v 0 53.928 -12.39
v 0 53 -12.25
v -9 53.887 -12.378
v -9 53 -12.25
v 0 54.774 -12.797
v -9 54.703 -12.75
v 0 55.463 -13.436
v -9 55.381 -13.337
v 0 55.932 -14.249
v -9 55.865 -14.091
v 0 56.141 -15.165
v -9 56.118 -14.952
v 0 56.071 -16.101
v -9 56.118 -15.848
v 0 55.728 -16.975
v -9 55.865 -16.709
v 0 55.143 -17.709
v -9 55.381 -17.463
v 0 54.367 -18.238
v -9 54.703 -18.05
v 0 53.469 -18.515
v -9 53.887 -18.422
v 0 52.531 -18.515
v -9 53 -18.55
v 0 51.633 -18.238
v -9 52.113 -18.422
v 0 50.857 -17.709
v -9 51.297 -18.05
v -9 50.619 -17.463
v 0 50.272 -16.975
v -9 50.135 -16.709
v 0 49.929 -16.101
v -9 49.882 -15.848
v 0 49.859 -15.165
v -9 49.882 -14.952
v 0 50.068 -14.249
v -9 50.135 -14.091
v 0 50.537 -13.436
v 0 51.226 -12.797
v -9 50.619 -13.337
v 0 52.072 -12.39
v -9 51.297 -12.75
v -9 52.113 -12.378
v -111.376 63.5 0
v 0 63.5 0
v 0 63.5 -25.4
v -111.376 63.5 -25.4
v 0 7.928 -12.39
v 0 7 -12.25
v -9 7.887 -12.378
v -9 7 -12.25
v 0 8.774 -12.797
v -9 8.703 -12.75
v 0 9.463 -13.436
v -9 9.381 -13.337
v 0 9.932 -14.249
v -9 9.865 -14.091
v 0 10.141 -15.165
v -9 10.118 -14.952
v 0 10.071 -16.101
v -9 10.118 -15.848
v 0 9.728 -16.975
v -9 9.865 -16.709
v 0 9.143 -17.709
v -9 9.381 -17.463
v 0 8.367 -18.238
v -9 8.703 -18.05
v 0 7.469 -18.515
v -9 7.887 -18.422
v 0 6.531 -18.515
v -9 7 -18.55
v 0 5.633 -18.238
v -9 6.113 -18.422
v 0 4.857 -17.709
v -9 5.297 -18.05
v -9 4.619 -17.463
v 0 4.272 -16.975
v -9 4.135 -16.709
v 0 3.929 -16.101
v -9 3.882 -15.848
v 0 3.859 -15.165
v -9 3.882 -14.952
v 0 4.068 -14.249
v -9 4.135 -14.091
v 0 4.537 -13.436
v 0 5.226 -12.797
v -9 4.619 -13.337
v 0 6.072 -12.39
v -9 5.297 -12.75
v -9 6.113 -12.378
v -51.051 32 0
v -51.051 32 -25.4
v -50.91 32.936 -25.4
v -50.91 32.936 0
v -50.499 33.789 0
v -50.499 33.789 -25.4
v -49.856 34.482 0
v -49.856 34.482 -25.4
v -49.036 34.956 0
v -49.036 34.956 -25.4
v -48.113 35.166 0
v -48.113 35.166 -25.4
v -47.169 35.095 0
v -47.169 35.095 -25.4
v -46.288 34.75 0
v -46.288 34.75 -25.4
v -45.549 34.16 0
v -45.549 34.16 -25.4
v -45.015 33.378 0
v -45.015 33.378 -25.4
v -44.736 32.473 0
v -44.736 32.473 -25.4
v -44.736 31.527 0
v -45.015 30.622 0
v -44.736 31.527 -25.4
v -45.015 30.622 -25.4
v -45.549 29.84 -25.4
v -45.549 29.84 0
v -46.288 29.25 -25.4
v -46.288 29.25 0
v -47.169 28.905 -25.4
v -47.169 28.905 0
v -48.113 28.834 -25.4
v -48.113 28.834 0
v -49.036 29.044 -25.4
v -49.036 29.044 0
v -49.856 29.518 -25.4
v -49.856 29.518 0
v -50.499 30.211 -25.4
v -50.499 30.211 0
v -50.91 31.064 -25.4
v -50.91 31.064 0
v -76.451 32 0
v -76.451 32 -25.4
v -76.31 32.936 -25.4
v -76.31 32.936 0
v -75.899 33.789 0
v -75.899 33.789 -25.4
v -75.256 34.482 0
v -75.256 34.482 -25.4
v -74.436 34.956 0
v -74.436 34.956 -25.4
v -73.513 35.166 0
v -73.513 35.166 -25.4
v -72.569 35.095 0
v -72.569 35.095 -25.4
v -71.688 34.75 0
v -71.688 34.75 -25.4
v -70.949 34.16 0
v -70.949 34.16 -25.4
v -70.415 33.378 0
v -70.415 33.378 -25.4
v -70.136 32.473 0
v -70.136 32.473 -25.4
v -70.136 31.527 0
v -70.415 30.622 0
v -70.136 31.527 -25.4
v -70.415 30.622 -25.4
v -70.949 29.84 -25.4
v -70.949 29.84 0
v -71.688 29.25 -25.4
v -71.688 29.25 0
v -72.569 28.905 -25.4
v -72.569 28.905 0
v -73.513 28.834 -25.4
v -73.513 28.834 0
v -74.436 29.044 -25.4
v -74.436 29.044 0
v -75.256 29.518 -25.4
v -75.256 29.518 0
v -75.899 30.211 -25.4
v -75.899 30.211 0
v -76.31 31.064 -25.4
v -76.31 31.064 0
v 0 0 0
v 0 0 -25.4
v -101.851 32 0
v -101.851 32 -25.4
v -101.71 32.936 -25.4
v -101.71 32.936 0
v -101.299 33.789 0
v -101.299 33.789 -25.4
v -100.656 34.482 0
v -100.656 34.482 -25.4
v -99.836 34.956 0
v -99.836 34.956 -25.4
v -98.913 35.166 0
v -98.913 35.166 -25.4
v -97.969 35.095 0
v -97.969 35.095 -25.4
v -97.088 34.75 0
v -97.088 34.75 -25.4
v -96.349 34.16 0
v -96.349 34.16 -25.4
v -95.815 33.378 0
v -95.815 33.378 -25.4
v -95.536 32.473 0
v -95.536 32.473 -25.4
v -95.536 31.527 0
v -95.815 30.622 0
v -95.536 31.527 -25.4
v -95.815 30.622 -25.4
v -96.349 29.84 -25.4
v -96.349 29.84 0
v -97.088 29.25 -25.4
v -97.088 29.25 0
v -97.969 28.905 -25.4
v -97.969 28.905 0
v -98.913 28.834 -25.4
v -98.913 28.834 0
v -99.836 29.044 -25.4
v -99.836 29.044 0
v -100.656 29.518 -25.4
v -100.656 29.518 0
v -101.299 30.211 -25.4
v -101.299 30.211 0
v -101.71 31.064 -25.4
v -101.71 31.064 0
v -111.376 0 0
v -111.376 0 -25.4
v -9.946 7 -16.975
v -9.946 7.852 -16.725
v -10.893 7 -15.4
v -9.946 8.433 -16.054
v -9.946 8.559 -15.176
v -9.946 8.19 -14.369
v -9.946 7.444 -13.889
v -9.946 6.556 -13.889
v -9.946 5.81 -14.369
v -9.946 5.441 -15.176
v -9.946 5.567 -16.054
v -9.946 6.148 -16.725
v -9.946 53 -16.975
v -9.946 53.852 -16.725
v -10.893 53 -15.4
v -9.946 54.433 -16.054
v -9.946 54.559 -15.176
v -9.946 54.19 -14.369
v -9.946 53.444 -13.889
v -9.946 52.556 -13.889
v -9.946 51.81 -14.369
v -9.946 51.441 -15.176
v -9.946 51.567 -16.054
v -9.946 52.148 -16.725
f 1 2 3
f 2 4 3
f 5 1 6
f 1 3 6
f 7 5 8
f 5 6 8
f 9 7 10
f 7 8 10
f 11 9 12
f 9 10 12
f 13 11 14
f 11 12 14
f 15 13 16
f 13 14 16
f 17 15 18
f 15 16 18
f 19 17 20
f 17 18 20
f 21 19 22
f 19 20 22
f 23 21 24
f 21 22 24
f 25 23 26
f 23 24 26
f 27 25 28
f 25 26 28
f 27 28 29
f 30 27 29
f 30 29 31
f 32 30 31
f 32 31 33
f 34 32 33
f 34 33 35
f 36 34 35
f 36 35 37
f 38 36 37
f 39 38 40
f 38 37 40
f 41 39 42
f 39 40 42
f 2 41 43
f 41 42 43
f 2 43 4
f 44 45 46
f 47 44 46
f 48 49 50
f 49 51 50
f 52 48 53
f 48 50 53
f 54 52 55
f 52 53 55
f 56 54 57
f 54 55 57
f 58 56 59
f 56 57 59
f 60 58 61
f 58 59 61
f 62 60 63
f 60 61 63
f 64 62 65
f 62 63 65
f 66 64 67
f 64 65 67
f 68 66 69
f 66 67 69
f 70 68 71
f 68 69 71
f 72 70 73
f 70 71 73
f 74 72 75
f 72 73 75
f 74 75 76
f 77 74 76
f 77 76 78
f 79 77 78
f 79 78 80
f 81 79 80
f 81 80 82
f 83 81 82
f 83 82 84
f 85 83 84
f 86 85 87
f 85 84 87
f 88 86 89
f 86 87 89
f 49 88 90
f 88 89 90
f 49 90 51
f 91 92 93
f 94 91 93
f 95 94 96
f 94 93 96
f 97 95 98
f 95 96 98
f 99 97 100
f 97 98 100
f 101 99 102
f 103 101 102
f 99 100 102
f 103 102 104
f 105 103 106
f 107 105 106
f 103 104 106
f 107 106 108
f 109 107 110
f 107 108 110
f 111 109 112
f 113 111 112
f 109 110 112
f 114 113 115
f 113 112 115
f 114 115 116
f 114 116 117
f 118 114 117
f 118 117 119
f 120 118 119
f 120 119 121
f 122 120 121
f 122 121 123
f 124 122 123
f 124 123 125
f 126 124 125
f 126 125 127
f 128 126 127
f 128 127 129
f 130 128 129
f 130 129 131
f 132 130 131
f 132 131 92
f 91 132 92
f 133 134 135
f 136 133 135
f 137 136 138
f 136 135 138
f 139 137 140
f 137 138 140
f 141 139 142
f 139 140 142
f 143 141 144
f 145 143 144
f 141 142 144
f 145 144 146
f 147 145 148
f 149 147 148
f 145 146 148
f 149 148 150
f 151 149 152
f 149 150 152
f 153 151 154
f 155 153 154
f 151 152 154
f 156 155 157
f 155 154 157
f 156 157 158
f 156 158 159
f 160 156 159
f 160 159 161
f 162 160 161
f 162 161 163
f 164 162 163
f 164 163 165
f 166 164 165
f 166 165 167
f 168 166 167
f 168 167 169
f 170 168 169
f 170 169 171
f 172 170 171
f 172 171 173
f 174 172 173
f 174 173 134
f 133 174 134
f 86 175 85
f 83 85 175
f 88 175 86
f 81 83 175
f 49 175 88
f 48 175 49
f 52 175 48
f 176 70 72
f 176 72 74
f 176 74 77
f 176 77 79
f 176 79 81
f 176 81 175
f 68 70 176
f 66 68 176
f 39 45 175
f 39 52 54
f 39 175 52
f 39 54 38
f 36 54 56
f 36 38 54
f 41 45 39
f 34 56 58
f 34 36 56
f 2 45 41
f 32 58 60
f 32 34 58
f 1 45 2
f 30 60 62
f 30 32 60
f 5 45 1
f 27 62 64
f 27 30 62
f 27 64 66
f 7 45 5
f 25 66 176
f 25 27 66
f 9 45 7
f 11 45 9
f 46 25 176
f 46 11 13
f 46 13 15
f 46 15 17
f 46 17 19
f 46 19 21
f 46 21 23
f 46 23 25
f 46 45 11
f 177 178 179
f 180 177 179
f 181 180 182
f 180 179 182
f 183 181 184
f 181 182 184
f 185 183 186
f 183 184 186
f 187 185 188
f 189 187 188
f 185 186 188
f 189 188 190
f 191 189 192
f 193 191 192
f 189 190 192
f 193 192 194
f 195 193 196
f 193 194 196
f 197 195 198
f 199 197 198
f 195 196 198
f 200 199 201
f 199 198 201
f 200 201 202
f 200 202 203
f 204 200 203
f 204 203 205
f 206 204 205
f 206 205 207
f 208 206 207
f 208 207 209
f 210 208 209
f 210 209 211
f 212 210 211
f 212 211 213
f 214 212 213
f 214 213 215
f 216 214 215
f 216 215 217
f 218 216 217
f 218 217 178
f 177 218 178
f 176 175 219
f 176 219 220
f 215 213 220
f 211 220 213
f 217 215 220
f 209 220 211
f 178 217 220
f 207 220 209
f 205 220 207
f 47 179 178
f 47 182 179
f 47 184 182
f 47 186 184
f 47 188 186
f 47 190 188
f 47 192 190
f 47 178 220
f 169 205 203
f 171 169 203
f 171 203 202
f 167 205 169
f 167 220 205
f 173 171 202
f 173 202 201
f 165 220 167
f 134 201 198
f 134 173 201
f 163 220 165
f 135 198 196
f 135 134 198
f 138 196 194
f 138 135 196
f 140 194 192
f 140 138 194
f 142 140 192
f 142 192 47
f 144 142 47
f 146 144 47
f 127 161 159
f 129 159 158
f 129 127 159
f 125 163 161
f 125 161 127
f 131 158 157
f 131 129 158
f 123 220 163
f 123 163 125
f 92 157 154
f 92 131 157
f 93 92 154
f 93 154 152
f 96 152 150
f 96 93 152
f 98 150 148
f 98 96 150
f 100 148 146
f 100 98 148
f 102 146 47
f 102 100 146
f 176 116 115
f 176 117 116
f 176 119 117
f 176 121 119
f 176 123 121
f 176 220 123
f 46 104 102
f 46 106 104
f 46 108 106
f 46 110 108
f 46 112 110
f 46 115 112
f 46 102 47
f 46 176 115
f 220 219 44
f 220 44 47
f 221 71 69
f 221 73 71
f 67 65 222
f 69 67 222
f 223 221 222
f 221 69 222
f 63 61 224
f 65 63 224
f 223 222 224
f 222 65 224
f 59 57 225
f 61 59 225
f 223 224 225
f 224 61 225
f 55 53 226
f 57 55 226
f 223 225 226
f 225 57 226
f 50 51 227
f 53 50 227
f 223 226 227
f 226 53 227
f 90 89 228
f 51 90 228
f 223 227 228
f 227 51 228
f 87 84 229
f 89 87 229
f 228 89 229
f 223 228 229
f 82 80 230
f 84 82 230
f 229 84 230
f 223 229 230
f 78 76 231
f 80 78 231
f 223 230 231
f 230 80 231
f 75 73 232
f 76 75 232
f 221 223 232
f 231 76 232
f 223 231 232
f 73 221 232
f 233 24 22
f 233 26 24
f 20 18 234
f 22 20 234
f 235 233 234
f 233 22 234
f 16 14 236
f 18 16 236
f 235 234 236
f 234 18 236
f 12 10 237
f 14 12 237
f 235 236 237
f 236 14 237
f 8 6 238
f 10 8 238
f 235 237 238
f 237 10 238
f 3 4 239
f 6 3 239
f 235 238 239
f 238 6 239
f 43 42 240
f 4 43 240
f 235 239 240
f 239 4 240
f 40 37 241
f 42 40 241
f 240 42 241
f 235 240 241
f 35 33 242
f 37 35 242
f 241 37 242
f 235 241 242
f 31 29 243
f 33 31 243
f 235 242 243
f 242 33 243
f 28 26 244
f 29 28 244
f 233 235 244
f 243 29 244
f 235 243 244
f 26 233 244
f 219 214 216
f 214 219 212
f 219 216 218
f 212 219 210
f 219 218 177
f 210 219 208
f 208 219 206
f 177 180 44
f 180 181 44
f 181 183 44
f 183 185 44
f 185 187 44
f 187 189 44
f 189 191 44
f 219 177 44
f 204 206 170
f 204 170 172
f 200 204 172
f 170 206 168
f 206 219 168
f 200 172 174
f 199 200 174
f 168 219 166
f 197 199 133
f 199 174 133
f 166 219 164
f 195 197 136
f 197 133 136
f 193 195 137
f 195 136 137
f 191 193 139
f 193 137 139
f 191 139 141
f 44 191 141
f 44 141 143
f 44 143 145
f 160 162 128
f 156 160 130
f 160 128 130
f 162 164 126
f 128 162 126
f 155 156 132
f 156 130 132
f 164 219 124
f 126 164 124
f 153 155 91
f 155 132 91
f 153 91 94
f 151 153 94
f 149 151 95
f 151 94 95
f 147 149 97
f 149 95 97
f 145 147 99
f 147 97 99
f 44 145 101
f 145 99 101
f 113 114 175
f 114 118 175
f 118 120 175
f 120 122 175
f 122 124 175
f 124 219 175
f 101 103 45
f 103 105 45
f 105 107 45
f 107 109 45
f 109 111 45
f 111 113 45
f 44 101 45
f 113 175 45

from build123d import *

# Parameters (mm, degrees)
SKETCH1_W                   = 25.4
SKETCH1_H                   = 63.5
BOSS_EXTRUDE1_DEPTH         = 111.37596
F_1_4_0_25_DIAMETER_HOLE1_D = 6.35
F_6_0MM_DOWEL_HOLE1_D       = 6.3
F_6_0MM_DOWEL_HOLE1_DEPTH   = 9.0000074
F_6_0MM_DOWEL_HOLE1_TIP     = 1.89271095


with BuildPart() as part:
    # Sketch1 → Boss-Extrude1 (new body)
    with BuildSketch(Plane(origin=(0, 0, 0), x_dir=(0, 0, -1), z_dir=(1, 0, 0))):
        with Locations((12.7, 31.75)):
            Rectangle(SKETCH1_W, SKETCH1_H)
    extrude(amount=-BOSS_EXTRUDE1_DEPTH)

    # 1/4 (0.25) Diameter Hole1 (through all)
    with Locations(Plane.XY):
        with Locations((-98.67596, 32), (-47.87596, 32), (-73.27596, 32)):
            Hole(F_1_4_0_25_DIAMETER_HOLE1_D / 2)

    # Ø6.0mm Dowel Hole1
    with Locations(Plane(origin=(0, 0, 0), x_dir=(0, 0, -1), z_dir=(1, 0, 0))):
        with Locations((15.4, 7), (15.4, 53)):
            Hole(F_6_0MM_DOWEL_HOLE1_D / 2, depth=F_6_0MM_DOWEL_HOLE1_DEPTH)
            with Locations((0, 0, -(F_6_0MM_DOWEL_HOLE1_DEPTH + F_6_0MM_DOWEL_HOLE1_TIP / 2))):  # 118° drill point
                Cone(0, F_6_0MM_DOWEL_HOLE1_D / 2, F_6_0MM_DOWEL_HOLE1_TIP, mode=Mode.SUBTRACT)


solid = part.part
